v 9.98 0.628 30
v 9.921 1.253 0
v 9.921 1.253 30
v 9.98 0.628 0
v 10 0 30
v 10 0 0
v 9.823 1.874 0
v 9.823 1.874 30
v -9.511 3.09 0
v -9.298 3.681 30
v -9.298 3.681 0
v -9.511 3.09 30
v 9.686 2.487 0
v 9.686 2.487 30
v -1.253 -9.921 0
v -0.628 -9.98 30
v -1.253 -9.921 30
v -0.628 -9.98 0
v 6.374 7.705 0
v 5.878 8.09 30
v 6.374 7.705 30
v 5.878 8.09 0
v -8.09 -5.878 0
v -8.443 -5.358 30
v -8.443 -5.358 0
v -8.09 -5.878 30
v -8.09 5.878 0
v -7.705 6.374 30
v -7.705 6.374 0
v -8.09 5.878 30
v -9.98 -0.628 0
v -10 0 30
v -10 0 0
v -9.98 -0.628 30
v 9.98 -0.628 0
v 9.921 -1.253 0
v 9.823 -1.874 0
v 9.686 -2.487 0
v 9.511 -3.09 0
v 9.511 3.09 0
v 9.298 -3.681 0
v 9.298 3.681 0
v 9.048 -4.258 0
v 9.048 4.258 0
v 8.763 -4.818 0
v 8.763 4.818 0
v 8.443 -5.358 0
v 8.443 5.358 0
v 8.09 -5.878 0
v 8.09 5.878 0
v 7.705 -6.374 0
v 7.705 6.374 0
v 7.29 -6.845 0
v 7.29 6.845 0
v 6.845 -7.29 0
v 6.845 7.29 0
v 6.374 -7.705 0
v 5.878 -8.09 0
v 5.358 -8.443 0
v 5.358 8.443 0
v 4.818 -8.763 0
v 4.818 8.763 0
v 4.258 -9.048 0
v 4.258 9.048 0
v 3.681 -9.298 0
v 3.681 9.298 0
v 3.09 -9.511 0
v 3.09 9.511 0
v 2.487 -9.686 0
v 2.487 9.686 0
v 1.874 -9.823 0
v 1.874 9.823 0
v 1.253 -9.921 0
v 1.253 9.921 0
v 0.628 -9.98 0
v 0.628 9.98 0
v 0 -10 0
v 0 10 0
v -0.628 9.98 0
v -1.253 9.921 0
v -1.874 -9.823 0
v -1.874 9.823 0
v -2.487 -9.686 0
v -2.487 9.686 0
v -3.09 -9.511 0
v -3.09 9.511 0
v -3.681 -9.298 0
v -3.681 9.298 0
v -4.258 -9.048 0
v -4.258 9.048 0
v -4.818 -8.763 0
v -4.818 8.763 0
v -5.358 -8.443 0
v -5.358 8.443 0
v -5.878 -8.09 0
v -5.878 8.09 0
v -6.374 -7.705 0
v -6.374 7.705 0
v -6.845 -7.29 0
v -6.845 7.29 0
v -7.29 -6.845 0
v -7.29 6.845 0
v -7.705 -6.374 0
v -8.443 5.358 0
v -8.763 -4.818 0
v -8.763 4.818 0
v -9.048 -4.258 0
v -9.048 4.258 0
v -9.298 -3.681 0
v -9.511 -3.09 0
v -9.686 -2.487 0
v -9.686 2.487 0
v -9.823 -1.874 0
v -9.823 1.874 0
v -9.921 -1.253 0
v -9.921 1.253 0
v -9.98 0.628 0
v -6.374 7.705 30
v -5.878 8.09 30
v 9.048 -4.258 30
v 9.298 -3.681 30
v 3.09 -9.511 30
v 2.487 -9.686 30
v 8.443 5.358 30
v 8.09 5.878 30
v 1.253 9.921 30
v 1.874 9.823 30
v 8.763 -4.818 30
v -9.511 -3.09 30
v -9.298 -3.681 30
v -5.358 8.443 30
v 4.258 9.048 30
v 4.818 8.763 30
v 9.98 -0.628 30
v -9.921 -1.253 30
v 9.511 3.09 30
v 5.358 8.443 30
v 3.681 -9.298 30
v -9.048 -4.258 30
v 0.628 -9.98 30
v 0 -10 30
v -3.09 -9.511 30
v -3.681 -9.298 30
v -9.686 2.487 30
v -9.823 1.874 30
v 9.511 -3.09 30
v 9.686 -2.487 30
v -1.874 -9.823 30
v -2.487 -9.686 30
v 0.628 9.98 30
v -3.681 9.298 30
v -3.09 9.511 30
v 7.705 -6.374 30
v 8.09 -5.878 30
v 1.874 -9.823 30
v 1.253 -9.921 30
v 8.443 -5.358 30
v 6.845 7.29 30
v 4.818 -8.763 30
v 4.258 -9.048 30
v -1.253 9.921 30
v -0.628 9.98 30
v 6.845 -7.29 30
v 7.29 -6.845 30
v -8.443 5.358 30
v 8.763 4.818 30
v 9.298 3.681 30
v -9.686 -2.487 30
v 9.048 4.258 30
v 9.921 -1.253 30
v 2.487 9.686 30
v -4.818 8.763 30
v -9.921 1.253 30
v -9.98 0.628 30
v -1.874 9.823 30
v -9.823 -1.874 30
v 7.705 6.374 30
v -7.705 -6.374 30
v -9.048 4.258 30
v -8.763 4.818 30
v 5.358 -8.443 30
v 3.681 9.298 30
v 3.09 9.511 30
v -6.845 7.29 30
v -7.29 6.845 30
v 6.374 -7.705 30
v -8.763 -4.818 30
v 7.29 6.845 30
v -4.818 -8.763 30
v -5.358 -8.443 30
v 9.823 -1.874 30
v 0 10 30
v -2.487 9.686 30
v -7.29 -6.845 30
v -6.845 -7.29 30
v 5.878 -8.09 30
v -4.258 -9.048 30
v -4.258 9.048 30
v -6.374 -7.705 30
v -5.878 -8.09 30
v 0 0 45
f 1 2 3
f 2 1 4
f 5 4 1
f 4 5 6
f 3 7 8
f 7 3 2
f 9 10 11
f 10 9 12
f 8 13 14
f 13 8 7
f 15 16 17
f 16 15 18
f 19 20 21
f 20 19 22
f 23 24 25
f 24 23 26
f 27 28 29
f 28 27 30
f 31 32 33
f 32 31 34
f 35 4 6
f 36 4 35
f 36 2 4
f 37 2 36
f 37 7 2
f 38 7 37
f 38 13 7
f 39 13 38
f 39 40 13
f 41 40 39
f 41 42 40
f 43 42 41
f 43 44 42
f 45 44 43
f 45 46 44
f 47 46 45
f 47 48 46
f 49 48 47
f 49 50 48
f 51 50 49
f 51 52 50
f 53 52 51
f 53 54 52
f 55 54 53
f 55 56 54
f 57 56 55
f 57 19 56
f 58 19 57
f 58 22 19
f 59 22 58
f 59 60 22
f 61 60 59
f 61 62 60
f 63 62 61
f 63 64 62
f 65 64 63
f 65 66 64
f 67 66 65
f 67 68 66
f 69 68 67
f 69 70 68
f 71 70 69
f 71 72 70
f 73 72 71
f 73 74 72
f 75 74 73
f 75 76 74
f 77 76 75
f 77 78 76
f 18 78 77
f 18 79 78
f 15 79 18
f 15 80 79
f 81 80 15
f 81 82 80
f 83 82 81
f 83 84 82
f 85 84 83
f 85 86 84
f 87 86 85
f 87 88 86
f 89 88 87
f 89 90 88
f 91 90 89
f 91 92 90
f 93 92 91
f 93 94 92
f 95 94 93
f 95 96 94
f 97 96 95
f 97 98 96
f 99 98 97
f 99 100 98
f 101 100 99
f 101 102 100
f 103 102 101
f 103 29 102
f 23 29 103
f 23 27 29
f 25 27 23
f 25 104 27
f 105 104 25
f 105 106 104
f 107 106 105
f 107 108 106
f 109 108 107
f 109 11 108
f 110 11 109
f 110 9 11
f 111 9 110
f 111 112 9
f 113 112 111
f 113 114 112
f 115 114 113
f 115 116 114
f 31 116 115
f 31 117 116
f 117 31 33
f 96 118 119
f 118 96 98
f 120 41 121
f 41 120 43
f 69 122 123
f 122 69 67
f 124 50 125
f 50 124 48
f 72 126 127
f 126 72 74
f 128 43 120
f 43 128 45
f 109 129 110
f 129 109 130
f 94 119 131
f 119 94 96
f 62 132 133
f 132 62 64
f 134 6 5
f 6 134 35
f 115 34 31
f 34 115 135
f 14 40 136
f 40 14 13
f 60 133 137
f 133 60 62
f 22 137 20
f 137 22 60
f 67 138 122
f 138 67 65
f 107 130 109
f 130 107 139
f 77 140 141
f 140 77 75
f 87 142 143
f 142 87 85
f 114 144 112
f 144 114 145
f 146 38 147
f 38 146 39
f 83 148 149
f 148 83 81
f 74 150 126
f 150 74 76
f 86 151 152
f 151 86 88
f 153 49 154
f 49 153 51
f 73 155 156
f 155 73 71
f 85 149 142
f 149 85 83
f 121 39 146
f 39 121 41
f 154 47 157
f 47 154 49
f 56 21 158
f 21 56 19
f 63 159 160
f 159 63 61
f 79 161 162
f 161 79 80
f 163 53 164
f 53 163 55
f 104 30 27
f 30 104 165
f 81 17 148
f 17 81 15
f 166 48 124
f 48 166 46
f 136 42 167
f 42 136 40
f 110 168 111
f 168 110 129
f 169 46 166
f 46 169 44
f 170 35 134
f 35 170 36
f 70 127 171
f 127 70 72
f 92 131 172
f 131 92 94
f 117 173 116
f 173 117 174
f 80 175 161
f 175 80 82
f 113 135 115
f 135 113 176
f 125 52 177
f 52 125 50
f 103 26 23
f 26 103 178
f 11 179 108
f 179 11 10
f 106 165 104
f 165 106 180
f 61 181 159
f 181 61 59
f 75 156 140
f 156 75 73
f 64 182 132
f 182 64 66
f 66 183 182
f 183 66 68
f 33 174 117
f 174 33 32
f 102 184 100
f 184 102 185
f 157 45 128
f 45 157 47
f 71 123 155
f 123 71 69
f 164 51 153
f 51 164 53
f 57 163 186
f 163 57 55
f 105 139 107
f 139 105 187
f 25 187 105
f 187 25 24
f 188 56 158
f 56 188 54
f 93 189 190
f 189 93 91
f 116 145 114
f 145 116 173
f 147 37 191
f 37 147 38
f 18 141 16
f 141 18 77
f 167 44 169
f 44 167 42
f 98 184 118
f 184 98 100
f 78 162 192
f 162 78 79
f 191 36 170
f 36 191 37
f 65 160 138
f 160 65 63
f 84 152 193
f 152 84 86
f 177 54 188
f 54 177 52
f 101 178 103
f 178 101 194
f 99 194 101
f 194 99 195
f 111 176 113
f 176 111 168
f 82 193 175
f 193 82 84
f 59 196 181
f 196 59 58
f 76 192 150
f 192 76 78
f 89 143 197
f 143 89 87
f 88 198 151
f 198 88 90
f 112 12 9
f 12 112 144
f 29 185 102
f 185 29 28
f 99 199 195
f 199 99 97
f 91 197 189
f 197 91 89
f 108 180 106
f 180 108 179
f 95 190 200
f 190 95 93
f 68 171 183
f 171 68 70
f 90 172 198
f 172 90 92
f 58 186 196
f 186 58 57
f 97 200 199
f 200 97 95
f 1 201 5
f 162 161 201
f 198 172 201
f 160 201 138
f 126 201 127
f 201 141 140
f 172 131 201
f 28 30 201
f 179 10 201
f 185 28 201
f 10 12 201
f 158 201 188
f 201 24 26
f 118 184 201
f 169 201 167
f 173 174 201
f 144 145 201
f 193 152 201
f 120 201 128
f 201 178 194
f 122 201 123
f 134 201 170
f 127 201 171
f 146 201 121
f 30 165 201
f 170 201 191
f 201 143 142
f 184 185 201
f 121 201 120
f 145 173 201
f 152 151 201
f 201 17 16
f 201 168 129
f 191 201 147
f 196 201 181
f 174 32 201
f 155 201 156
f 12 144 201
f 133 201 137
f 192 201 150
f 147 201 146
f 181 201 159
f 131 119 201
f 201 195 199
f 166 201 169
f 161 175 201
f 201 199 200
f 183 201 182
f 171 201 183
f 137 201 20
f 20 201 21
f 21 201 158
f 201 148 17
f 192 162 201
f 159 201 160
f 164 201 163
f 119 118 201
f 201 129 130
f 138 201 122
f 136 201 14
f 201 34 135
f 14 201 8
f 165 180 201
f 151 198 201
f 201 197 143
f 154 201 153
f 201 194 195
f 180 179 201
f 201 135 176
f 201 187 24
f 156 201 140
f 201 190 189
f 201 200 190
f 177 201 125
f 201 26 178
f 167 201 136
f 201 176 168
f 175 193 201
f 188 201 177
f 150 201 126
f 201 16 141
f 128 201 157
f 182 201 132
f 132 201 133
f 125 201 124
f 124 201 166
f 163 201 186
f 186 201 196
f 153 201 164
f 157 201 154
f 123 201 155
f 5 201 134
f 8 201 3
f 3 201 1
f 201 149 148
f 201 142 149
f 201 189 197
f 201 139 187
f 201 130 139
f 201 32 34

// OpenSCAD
// Maße des Turms
turm_radius = 10;
turm_hoehe = 30;
dach_hoehe = 15;

// Farben
turm_farbe = [21/255, 153/255, 137/255]; // #159989
dach_farbe = [249/255, 179/255, 56/255]; // #F9B338

// Turmteil
color(turm_farbe)
cylinder(h = turm_hoehe, r1 = turm_radius, r2 = turm_radius, $fn = 100);

// Kegeldach
translate([0, 0, turm_hoehe])
color(dach_farbe)
cylinder(h = dach_hoehe, r1 = turm_radius, r2 = 0, $fn = 100);
